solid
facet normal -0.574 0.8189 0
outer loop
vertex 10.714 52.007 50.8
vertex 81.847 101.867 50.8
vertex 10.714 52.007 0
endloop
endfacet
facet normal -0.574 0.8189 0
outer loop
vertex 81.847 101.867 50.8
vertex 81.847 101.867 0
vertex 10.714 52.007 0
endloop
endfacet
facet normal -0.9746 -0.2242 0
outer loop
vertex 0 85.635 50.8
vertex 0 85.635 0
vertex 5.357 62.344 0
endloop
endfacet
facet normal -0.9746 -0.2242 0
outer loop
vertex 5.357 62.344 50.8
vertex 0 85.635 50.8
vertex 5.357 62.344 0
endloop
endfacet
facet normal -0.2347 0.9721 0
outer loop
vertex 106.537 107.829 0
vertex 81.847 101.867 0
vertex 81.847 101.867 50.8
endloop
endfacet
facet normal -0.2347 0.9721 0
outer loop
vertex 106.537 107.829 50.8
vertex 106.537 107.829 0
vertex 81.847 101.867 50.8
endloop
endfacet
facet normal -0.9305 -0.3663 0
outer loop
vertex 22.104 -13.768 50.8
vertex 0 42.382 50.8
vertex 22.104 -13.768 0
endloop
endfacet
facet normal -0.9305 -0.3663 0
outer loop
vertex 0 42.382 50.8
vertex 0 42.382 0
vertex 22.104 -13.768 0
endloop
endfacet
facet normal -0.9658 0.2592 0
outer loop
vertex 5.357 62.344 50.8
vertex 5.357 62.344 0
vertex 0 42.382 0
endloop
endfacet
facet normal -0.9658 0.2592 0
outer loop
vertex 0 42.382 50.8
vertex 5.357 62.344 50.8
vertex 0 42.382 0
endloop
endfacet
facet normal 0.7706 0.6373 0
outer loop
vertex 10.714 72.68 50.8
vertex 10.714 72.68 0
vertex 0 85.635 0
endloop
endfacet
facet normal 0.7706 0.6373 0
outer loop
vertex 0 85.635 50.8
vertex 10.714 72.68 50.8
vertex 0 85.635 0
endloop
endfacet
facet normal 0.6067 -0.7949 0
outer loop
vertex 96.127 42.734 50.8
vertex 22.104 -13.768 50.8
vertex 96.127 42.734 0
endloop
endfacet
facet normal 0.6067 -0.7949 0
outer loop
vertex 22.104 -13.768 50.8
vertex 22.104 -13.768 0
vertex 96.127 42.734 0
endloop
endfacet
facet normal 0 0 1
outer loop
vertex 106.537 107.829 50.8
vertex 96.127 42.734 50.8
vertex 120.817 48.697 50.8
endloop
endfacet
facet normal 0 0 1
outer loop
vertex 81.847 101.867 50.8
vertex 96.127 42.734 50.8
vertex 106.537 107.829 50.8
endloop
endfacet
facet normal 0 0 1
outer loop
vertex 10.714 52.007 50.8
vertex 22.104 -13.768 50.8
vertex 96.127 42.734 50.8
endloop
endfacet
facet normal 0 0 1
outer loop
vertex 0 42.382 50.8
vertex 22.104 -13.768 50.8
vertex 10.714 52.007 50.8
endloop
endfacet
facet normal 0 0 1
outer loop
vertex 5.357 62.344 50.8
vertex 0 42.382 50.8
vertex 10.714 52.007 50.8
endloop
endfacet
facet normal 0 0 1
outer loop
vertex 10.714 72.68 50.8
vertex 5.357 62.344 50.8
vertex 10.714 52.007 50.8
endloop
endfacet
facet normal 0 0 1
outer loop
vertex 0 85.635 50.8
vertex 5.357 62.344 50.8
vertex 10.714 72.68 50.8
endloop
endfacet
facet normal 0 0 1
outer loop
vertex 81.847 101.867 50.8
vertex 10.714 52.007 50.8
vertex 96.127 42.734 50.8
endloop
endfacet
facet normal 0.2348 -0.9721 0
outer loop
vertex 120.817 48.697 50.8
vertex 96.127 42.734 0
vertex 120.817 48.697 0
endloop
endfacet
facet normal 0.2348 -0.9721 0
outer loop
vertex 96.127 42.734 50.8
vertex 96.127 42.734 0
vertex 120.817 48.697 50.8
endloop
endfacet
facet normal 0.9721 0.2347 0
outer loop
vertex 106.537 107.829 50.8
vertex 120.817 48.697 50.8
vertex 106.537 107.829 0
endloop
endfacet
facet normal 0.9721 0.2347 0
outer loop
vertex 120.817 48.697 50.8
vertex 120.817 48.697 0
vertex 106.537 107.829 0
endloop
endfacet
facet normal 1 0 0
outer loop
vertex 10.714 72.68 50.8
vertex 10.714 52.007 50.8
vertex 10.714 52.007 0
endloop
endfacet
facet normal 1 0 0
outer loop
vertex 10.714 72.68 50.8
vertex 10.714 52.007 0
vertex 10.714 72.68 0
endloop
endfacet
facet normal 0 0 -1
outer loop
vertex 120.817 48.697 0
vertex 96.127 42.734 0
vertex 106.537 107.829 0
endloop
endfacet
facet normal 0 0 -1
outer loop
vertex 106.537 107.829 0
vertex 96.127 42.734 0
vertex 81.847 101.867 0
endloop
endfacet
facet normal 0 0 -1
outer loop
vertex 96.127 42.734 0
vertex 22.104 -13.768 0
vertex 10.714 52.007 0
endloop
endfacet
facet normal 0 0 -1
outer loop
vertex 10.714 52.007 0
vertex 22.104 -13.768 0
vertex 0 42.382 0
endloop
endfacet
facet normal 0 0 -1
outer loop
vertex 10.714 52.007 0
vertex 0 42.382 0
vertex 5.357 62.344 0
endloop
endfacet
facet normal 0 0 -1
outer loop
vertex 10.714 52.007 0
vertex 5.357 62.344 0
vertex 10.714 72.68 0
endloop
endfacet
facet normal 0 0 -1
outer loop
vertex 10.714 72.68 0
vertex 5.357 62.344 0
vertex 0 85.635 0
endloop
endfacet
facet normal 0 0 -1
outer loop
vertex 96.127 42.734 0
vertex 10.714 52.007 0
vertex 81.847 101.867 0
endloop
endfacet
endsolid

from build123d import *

# Parameters (mm, degrees)
F1_DEPTH = 25.4
F2_DEPTH = 25.4
F3_DEPTH = 25.4


with BuildPart() as f1:
    # F0 (on Top) → F1 (new body)
    with BuildSketch(Plane.XY):
        Polygon((5.3568482399, 62.3435284942), (0, 42.381696403), (22.1037119627, -13.7682110071), (96.1266011, 42.7341908216), (81.8468928337, 101.8667668104), (10.7136964798, 52.0066134632), (10.7136964798, 72.6804435253), (0, 85.6353342533), align=None)
    extrude(amount=F1_DEPTH)

    # F2 (add): a face of the model
    f2_faces = [f1.faces().sort_by_distance(p)[0] for p in [
        (47.6996824871, 44.5902490016, 25.4),
    ]]
    extrude(f2_faces, amount=F2_DEPTH)

    # F3 (add): a face of the model
    f3_faces = [f1.faces().sort_by_distance(p)[0] for p in [
        (88.9867469668, 72.300478816, 25.4),
    ]]
    extrude(f3_faces, amount=F3_DEPTH)


solid = f1.part
